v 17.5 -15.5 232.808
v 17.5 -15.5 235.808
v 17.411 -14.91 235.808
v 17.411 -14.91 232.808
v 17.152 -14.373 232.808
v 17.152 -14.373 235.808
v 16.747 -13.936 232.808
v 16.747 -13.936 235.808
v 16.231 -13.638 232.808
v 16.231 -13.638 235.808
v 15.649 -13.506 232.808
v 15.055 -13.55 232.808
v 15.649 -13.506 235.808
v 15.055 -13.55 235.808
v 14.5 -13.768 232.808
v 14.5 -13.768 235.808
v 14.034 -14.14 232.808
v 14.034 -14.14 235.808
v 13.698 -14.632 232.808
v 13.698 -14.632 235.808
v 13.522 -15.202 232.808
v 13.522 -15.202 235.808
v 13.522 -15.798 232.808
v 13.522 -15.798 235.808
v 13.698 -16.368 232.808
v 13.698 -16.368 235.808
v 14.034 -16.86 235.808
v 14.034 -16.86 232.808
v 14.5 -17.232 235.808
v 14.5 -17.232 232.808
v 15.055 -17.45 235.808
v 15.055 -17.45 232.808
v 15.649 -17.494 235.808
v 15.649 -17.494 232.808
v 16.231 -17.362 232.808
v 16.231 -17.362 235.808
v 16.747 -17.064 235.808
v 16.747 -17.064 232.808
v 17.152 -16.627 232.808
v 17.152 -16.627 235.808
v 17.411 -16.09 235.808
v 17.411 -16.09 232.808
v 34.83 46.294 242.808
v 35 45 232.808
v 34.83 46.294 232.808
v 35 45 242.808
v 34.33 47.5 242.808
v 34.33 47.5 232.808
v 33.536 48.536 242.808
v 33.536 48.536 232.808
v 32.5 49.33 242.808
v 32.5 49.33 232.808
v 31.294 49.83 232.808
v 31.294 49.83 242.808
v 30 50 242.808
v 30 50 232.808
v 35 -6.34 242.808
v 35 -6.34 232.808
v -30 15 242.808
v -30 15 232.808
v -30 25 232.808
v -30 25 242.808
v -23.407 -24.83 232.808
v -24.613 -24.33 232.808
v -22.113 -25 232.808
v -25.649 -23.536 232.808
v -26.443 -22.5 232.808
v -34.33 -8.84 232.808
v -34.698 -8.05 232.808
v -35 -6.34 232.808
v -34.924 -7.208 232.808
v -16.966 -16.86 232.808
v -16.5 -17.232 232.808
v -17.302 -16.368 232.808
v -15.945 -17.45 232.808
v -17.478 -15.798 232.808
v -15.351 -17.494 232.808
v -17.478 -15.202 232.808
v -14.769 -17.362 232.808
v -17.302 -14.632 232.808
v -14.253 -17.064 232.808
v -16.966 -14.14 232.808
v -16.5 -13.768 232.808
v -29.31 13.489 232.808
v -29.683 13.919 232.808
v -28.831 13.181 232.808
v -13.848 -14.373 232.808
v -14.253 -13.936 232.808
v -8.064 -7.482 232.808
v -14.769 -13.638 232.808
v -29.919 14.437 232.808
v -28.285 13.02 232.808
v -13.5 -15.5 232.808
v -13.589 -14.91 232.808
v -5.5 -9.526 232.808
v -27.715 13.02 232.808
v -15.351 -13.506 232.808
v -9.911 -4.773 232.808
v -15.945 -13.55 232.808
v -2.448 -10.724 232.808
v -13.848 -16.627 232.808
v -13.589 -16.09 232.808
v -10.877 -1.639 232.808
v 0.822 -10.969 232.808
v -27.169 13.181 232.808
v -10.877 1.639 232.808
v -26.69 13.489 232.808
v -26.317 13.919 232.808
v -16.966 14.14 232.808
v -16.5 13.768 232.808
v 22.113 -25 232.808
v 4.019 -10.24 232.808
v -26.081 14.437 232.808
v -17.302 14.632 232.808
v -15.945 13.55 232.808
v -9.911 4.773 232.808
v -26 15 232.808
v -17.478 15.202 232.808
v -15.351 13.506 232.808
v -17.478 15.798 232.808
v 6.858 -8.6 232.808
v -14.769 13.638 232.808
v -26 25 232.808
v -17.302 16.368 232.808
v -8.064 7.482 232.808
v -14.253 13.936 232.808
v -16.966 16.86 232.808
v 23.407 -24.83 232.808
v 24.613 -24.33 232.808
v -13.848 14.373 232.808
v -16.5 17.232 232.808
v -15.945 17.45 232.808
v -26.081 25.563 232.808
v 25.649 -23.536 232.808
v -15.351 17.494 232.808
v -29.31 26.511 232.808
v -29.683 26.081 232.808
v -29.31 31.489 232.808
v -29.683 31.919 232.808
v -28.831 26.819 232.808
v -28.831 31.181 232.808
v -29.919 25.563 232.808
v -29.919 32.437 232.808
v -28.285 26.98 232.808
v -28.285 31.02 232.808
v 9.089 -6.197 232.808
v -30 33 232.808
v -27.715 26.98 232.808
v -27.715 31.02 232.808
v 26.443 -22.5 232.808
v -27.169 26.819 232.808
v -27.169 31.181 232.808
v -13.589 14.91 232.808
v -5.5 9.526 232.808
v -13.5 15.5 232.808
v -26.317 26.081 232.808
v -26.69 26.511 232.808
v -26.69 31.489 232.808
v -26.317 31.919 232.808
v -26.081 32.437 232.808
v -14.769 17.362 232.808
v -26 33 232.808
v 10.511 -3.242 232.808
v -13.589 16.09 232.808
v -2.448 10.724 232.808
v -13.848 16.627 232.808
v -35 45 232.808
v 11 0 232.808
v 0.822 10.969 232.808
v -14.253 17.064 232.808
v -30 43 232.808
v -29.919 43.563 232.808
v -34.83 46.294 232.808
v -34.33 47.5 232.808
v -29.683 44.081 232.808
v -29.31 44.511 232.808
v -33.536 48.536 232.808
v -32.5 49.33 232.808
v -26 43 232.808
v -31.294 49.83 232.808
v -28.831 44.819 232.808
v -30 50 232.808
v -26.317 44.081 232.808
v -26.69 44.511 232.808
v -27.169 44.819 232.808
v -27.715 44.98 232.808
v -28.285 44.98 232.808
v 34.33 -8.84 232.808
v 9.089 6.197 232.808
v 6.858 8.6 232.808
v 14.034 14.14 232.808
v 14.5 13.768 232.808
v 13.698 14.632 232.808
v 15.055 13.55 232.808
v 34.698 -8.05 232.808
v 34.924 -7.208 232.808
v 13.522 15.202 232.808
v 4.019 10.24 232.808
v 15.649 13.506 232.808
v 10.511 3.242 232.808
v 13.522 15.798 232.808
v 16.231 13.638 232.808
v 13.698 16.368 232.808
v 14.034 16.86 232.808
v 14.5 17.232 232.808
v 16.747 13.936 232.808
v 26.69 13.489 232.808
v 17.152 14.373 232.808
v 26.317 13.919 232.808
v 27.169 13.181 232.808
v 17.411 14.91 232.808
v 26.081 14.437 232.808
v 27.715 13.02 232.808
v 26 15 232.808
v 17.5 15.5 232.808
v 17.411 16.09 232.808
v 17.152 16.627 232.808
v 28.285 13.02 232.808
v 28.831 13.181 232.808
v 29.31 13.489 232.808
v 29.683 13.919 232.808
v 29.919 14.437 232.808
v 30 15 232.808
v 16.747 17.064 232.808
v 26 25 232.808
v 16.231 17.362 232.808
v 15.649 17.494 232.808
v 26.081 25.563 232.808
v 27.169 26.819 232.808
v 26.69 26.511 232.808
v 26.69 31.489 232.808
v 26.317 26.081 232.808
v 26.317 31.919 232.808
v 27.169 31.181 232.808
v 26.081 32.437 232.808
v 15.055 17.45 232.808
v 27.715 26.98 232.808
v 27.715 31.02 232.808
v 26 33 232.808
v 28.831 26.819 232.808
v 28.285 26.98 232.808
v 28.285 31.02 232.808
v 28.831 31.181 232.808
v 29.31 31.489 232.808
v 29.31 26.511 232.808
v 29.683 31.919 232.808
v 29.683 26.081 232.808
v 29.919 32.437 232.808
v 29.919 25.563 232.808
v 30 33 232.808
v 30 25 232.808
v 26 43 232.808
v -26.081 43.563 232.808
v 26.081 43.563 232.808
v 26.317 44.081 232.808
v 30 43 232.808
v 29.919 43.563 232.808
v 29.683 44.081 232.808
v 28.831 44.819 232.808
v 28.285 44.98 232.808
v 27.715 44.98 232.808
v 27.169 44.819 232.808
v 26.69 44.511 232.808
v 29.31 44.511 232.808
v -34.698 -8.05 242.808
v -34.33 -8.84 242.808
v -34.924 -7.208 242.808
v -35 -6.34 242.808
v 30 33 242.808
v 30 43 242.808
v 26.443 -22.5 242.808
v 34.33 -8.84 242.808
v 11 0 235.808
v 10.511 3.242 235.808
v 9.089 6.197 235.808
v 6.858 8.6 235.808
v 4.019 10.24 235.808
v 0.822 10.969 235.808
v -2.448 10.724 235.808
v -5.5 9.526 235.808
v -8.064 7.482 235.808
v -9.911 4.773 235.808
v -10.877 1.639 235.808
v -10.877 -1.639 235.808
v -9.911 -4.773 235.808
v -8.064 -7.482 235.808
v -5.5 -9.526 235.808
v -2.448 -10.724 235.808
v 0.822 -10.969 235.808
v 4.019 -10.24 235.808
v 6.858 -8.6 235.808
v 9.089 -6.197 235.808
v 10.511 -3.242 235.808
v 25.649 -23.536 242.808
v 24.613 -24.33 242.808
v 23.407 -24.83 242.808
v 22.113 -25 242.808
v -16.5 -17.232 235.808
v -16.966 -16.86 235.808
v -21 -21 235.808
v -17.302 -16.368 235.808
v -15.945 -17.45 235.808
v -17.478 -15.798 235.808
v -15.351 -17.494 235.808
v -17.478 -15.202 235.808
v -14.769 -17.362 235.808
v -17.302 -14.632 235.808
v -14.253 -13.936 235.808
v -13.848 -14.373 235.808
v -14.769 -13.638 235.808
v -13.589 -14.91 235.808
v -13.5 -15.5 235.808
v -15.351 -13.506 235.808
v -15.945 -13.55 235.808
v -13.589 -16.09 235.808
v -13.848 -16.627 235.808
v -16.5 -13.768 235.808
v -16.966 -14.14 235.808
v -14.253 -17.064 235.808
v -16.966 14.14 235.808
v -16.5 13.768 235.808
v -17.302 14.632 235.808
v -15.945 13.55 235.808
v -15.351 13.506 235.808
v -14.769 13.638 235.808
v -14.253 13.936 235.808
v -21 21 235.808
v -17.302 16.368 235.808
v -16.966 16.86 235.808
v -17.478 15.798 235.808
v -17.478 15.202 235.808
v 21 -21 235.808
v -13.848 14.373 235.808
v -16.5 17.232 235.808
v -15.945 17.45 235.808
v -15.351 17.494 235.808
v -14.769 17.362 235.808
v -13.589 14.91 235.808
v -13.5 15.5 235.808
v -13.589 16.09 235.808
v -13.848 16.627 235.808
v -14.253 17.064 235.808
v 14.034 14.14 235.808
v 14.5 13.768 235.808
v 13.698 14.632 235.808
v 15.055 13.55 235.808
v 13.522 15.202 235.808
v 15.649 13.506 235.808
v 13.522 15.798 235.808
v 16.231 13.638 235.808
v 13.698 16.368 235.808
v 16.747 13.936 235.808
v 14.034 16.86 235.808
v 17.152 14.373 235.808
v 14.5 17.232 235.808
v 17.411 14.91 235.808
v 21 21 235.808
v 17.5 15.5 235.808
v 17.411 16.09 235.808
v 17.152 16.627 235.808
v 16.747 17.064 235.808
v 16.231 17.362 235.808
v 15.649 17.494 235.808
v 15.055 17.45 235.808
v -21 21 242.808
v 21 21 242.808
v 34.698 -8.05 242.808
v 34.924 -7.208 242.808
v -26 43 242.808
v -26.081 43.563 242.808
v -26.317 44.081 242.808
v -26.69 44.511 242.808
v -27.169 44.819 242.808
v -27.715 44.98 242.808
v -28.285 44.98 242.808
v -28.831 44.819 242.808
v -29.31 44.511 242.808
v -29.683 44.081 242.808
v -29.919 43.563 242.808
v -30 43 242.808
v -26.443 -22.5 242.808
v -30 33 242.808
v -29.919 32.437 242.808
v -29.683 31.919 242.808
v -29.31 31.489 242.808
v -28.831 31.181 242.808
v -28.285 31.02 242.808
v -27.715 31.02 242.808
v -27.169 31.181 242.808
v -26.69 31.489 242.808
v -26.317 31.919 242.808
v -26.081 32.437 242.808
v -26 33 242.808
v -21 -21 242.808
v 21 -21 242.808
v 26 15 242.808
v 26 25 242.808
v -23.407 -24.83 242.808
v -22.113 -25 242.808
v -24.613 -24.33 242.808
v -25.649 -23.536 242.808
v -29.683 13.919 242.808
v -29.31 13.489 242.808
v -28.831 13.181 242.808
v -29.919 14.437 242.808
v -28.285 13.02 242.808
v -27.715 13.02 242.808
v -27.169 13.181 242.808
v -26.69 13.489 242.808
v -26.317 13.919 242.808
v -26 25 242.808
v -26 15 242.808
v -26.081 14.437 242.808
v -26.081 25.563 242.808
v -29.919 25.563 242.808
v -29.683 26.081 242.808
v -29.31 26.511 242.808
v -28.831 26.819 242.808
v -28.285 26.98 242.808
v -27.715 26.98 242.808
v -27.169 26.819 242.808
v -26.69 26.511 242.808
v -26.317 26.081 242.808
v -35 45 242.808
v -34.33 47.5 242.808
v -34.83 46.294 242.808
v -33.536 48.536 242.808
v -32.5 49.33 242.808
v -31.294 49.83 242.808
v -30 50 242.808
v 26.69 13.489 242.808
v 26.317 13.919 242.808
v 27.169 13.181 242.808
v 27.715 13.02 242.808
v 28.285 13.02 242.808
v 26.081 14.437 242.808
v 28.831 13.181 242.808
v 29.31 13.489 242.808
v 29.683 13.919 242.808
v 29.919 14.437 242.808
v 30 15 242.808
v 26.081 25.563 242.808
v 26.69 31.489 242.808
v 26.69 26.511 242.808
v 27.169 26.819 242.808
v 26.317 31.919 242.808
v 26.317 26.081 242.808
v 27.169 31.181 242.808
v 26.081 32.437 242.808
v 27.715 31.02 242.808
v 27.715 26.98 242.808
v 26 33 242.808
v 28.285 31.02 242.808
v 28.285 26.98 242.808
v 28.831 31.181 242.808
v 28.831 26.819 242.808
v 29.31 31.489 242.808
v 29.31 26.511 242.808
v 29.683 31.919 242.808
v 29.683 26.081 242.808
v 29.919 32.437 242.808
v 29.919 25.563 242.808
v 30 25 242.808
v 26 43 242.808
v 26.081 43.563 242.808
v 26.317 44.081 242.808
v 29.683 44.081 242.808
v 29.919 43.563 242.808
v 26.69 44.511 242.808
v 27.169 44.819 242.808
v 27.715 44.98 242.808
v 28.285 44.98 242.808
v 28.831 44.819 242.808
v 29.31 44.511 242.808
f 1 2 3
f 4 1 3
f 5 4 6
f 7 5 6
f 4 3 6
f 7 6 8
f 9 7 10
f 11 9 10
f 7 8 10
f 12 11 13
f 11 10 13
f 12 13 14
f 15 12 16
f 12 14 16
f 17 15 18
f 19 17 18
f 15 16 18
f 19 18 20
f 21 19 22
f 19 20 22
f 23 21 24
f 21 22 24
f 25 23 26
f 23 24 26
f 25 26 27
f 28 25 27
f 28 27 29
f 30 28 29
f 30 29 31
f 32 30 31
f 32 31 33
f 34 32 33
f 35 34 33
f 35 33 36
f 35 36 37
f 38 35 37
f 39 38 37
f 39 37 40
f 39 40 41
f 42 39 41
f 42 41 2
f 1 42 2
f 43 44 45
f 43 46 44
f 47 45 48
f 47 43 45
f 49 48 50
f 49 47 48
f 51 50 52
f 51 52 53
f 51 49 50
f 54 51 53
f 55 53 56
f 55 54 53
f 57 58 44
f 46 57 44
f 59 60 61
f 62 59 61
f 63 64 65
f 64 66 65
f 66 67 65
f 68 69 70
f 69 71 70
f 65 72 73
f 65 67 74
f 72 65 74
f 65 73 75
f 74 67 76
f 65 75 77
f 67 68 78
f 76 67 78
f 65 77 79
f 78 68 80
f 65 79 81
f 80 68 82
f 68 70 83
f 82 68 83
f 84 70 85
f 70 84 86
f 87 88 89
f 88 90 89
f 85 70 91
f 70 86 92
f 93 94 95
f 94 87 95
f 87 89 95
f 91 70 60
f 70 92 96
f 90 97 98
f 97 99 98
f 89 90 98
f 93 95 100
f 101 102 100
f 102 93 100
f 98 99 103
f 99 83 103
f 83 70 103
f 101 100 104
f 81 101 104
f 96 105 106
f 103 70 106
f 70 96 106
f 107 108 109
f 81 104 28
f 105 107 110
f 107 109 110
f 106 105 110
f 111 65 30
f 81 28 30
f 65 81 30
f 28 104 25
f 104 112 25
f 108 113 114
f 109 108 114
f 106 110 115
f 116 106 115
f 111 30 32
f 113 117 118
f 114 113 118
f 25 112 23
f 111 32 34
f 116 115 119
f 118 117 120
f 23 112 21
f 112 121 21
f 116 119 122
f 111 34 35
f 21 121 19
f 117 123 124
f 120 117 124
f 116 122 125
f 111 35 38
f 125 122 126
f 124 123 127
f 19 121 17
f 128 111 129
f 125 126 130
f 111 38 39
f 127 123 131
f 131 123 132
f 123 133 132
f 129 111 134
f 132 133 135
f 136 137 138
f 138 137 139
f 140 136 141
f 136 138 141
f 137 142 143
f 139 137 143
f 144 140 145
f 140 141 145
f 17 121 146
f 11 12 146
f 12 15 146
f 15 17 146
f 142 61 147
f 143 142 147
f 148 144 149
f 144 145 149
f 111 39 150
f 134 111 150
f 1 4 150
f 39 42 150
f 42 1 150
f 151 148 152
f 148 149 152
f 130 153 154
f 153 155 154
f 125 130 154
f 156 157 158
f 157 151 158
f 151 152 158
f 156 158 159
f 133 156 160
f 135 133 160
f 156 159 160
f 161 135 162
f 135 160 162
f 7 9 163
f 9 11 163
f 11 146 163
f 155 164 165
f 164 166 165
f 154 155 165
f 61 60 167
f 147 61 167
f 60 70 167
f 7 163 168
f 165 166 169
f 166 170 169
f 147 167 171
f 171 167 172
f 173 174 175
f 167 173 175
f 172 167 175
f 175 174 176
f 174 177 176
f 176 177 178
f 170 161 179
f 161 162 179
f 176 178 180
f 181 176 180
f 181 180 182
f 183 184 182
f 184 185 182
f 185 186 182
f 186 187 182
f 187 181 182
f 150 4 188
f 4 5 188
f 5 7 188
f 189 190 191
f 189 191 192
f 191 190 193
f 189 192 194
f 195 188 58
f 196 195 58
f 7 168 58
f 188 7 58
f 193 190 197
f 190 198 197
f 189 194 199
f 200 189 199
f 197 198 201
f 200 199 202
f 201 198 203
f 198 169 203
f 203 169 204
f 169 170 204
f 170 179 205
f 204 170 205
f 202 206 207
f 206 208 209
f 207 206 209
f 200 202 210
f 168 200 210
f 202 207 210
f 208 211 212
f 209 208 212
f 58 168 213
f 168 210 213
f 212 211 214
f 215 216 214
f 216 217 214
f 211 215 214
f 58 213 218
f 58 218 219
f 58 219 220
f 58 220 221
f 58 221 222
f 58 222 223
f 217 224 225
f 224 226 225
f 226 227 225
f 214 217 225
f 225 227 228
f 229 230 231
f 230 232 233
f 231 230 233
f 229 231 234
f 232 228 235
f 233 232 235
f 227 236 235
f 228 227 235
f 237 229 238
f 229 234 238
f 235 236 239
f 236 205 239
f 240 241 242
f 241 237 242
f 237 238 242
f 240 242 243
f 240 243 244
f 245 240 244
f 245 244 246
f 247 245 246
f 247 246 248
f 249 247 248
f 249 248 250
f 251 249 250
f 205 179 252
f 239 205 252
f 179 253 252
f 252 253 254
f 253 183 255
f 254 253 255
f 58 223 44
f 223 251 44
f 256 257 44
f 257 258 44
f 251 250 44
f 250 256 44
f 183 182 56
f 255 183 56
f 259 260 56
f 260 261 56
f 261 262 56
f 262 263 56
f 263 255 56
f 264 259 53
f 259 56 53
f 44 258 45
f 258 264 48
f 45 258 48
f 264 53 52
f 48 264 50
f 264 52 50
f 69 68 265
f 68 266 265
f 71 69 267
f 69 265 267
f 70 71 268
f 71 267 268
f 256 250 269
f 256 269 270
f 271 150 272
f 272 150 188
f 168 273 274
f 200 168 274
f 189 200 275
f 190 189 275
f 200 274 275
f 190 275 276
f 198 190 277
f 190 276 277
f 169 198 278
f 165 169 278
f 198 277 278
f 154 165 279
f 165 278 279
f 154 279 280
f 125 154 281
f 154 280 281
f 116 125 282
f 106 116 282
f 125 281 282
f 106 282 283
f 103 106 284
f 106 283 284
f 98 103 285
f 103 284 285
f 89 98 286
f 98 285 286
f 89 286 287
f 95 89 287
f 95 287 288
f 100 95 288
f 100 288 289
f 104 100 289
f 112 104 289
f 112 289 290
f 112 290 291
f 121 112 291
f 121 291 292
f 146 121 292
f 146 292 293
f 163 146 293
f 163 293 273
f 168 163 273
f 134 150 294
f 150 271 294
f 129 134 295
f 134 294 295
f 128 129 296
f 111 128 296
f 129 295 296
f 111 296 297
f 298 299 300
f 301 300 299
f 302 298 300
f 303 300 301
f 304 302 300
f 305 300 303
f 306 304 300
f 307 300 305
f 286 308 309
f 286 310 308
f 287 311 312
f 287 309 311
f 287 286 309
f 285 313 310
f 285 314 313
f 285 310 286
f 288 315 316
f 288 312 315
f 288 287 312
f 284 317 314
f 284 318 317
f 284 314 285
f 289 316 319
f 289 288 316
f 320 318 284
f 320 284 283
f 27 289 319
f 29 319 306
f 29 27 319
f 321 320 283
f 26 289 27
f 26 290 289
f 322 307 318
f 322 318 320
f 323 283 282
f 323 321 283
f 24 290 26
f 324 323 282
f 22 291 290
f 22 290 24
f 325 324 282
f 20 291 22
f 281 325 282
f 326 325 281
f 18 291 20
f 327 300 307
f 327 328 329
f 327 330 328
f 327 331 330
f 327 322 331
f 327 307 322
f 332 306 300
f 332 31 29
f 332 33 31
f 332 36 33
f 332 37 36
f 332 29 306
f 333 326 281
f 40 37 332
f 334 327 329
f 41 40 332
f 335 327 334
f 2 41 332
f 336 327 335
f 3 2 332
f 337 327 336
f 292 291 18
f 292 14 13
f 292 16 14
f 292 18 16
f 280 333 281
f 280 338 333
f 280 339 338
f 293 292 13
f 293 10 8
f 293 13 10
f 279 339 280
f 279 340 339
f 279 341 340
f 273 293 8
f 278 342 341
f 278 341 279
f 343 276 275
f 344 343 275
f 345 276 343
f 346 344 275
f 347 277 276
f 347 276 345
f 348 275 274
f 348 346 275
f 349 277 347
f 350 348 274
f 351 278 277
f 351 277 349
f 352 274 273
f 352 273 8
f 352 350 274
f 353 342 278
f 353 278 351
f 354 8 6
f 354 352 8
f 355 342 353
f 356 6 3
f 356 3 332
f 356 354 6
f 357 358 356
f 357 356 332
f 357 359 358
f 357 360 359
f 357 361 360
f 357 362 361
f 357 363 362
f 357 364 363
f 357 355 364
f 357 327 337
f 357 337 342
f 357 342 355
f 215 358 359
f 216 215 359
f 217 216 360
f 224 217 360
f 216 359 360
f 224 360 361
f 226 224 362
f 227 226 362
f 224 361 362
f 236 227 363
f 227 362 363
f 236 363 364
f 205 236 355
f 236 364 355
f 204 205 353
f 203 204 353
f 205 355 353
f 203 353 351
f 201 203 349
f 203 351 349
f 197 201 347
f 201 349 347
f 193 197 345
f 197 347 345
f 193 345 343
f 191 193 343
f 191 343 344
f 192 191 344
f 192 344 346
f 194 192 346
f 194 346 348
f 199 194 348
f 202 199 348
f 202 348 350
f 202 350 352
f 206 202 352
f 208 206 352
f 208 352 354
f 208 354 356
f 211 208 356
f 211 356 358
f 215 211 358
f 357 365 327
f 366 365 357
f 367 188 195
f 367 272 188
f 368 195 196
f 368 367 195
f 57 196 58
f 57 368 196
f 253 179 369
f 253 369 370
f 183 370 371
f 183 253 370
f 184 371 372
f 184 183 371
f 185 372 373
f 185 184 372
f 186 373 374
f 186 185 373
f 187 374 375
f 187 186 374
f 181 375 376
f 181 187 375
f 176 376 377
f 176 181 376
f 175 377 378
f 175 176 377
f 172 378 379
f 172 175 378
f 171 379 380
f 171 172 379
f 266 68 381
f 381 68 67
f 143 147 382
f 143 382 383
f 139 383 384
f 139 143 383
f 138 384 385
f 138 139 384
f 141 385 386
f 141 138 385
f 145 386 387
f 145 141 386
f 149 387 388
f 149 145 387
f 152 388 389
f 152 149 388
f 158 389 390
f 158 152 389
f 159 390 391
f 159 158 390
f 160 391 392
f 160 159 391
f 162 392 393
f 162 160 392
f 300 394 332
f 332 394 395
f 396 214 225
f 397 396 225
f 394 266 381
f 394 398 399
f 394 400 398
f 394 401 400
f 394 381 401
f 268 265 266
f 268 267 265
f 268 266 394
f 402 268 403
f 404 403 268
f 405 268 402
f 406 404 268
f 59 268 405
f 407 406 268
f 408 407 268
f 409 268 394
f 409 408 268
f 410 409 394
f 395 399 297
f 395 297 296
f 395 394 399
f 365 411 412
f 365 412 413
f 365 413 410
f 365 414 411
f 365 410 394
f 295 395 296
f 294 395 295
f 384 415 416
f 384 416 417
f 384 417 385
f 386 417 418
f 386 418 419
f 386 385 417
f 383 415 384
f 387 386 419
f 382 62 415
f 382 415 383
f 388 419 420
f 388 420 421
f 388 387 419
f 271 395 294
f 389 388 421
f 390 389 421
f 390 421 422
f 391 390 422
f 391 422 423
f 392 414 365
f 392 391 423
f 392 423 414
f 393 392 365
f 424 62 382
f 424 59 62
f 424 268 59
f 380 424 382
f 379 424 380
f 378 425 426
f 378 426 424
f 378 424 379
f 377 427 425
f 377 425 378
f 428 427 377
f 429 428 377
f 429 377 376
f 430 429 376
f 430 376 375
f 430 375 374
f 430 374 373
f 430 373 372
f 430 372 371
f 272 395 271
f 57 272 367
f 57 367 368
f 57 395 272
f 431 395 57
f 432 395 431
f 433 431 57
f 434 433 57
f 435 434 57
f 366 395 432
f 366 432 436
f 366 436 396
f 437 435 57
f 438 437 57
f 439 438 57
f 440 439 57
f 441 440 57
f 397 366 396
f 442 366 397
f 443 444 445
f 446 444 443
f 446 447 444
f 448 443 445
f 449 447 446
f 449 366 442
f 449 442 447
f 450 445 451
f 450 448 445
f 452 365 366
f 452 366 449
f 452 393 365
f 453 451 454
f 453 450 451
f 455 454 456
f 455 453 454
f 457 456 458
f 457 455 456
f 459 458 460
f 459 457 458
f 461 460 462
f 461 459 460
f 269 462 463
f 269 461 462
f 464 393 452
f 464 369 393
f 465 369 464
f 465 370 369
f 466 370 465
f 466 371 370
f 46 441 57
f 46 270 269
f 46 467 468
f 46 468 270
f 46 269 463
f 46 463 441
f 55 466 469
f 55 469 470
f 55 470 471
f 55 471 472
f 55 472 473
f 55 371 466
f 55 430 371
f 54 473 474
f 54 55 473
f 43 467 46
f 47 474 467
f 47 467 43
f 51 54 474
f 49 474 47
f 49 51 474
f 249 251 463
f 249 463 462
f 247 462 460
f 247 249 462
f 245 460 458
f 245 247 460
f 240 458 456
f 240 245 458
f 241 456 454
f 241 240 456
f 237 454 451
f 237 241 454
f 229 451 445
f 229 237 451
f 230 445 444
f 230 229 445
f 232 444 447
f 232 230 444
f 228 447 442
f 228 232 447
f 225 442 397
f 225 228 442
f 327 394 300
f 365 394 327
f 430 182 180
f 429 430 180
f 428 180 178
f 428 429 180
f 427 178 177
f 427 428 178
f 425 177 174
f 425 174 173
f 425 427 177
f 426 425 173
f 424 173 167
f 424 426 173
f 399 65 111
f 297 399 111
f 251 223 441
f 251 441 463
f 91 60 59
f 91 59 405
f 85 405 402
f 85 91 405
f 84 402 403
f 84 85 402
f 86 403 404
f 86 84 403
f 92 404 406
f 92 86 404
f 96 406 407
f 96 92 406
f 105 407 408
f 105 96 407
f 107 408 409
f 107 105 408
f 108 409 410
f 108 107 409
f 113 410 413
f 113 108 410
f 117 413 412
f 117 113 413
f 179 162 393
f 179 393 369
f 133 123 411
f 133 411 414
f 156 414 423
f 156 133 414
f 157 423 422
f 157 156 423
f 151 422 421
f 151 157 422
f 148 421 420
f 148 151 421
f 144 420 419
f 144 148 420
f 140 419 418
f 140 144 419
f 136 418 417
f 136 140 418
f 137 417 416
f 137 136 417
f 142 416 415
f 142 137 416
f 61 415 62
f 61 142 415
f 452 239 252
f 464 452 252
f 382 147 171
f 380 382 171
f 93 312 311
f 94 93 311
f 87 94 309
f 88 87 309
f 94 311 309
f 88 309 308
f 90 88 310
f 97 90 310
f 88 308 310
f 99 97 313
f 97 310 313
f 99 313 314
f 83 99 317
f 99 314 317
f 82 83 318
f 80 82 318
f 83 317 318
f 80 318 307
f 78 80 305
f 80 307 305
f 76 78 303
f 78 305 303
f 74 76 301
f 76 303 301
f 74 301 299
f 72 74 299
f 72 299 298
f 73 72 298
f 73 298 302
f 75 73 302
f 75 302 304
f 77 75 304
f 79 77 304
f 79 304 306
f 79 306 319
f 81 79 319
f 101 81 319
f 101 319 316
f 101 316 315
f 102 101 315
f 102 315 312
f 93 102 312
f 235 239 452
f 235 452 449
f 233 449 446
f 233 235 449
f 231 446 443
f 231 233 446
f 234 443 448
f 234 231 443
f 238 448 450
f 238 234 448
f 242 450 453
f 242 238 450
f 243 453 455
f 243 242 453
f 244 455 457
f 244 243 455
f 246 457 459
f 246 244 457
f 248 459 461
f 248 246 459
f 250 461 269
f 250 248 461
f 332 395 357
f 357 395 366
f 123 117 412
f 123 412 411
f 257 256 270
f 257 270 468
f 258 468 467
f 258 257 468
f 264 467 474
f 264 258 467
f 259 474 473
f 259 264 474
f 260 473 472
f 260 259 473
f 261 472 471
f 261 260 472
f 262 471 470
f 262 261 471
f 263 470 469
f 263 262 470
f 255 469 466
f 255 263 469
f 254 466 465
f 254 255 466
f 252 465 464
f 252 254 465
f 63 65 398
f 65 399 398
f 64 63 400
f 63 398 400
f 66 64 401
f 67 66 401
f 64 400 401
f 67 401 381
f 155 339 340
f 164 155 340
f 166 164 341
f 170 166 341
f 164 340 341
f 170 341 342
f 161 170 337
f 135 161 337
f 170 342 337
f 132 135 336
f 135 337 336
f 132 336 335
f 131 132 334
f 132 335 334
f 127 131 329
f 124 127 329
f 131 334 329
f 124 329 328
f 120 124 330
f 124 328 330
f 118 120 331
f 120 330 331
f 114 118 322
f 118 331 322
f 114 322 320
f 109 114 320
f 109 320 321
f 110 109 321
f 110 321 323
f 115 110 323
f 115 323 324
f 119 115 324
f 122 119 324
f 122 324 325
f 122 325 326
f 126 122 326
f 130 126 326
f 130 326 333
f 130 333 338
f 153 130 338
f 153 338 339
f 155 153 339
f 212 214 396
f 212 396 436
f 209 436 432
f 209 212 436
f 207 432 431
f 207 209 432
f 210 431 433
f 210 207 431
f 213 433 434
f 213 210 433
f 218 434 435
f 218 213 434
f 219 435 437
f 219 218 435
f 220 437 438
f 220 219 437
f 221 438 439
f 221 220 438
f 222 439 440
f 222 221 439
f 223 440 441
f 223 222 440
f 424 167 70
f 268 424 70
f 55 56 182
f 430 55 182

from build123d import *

# Parameters (mm, degrees)
SKETCH023_W                     = 50
SKETCH023_H                     = 50
PAD005_DEPTH                    = 10
SKETCH024_W                     = 42
SKETCH024_H                     = 42
POCKET014_DEPTH                 = 7
SKETCH025_R                     = 11
POCKET015_DEPTH                 = 3.001
SKETCH022_R                     = 2
POCKET016_DEPTH                 = 5
PAD006_DEPTH                    = 10
POCKET017_DEPTH                 = 216.156281
POCKET017_LINEARPATTERN_2_DEPTH = 216.156281
LINEARPATTERN001_COUNT          = 2
LINEARPATTERN001_PITCH          = 18
FILLET002_R                     = 5


with BuildPart() as part:
    # Sketch023 → Pad005 (new body)
    with BuildSketch(Plane.XY):
        Rectangle(SKETCH023_W, SKETCH023_H)
    extrude(amount=PAD005_DEPTH)

    # Sketch024 (on Face6 of Pad005) → Pocket014 (cut)
    with BuildSketch(Plane.XY.offset(10)):
        Rectangle(SKETCH024_W, SKETCH024_H)
    extrude(amount=-POCKET014_DEPTH, mode=Mode.SUBTRACT)

    # Sketch025 (on Face11 of Pocket014) → Pocket015 (cut, through all)
    with BuildSketch(Plane.XY.offset(3)):
        Circle(SKETCH025_R)
    extrude(amount=-POCKET015_DEPTH, mode=Mode.SUBTRACT)

    # Sketch022 → Pocket016 (cut)
    with BuildSketch(Plane.XY.offset(5)):
        with Locations((-15.5, 15.5)):
            Circle(SKETCH022_R)
        with Locations((15.5, 15.5)):
            Circle(SKETCH022_R)
        with Locations((15.5, -15.5)):
            Circle(SKETCH022_R)
        with Locations((-15.5, -15.5)):
            Circle(SKETCH022_R)
    extrude(amount=-POCKET016_DEPTH, mode=Mode.SUBTRACT)

    # Sketch026 → Pad006 (join)
    with BuildSketch(Plane.XY):
        Polygon((-25, 25), (25, 25), (25, -25), (35, -7.679492), (35, 50), (-35, 50), (-35, -7.679492), (-25, -25), align=None)
    extrude(amount=PAD006_DEPTH)

    # Sketch021 → Pocket017 (cut, through all)
    with BuildSketch(Plane.XY):
        with BuildLine():
            ThreePointArc((-30, 15), (-28, 13), (-26, 15))
            Line((-26, 15), (-26, 25))
            ThreePointArc((-26, 25), (-28, 27), (-30, 25))
            Line((-30, 15), (-30, 25))
        make_face()
    pocket017 = extrude(amount=POCKET017_DEPTH, mode=Mode.SUBTRACT)

    # Sketch021 LinearPattern 2 → Pocket017 LinearPattern 2 (cut, through all)
    with BuildSketch(Plane(origin=(56, 0, 0), x_dir=(1, 0, 0), z_dir=(0, 0, 1))):
        with BuildLine():
            ThreePointArc((-30, 15), (-28, 13), (-26, 15))
            Line((-26, 15), (-26, 25))
            ThreePointArc((-26, 25), (-28, 27), (-30, 25))
            Line((-30, 15), (-30, 25))
        make_face()
    pocket017_linearpattern_2 = extrude(amount=POCKET017_LINEARPATTERN_2_DEPTH, mode=Mode.SUBTRACT)

    # LinearPattern001: Pocket017, Pocket017 LinearPattern 2 ×2
    with Locations(*[(0, i * LINEARPATTERN001_PITCH, 0) for i in range(1, LINEARPATTERN001_COUNT)]):
        add(pocket017, mode=Mode.SUBTRACT)
        add(pocket017_linearpattern_2, mode=Mode.SUBTRACT)

    # Fillet002
    fillet002_edges = [part.edges().sort_by_distance(p)[0] for p in [
        (25, -25, 5),
        (35, -7.679492, 5),
        (35, 50, 5),
        (-25, -25, 5),
        (-35, -7.679492, 5),
        (-35, 50, 5),
    ]]
    fillet(fillet002_edges, radius=FILLET002_R)


with BuildPart() as part_1:
    # Body007 placement: moved
    add(part.part.moved(Location((0, 0, 232.808))))


solid = part_1.part
